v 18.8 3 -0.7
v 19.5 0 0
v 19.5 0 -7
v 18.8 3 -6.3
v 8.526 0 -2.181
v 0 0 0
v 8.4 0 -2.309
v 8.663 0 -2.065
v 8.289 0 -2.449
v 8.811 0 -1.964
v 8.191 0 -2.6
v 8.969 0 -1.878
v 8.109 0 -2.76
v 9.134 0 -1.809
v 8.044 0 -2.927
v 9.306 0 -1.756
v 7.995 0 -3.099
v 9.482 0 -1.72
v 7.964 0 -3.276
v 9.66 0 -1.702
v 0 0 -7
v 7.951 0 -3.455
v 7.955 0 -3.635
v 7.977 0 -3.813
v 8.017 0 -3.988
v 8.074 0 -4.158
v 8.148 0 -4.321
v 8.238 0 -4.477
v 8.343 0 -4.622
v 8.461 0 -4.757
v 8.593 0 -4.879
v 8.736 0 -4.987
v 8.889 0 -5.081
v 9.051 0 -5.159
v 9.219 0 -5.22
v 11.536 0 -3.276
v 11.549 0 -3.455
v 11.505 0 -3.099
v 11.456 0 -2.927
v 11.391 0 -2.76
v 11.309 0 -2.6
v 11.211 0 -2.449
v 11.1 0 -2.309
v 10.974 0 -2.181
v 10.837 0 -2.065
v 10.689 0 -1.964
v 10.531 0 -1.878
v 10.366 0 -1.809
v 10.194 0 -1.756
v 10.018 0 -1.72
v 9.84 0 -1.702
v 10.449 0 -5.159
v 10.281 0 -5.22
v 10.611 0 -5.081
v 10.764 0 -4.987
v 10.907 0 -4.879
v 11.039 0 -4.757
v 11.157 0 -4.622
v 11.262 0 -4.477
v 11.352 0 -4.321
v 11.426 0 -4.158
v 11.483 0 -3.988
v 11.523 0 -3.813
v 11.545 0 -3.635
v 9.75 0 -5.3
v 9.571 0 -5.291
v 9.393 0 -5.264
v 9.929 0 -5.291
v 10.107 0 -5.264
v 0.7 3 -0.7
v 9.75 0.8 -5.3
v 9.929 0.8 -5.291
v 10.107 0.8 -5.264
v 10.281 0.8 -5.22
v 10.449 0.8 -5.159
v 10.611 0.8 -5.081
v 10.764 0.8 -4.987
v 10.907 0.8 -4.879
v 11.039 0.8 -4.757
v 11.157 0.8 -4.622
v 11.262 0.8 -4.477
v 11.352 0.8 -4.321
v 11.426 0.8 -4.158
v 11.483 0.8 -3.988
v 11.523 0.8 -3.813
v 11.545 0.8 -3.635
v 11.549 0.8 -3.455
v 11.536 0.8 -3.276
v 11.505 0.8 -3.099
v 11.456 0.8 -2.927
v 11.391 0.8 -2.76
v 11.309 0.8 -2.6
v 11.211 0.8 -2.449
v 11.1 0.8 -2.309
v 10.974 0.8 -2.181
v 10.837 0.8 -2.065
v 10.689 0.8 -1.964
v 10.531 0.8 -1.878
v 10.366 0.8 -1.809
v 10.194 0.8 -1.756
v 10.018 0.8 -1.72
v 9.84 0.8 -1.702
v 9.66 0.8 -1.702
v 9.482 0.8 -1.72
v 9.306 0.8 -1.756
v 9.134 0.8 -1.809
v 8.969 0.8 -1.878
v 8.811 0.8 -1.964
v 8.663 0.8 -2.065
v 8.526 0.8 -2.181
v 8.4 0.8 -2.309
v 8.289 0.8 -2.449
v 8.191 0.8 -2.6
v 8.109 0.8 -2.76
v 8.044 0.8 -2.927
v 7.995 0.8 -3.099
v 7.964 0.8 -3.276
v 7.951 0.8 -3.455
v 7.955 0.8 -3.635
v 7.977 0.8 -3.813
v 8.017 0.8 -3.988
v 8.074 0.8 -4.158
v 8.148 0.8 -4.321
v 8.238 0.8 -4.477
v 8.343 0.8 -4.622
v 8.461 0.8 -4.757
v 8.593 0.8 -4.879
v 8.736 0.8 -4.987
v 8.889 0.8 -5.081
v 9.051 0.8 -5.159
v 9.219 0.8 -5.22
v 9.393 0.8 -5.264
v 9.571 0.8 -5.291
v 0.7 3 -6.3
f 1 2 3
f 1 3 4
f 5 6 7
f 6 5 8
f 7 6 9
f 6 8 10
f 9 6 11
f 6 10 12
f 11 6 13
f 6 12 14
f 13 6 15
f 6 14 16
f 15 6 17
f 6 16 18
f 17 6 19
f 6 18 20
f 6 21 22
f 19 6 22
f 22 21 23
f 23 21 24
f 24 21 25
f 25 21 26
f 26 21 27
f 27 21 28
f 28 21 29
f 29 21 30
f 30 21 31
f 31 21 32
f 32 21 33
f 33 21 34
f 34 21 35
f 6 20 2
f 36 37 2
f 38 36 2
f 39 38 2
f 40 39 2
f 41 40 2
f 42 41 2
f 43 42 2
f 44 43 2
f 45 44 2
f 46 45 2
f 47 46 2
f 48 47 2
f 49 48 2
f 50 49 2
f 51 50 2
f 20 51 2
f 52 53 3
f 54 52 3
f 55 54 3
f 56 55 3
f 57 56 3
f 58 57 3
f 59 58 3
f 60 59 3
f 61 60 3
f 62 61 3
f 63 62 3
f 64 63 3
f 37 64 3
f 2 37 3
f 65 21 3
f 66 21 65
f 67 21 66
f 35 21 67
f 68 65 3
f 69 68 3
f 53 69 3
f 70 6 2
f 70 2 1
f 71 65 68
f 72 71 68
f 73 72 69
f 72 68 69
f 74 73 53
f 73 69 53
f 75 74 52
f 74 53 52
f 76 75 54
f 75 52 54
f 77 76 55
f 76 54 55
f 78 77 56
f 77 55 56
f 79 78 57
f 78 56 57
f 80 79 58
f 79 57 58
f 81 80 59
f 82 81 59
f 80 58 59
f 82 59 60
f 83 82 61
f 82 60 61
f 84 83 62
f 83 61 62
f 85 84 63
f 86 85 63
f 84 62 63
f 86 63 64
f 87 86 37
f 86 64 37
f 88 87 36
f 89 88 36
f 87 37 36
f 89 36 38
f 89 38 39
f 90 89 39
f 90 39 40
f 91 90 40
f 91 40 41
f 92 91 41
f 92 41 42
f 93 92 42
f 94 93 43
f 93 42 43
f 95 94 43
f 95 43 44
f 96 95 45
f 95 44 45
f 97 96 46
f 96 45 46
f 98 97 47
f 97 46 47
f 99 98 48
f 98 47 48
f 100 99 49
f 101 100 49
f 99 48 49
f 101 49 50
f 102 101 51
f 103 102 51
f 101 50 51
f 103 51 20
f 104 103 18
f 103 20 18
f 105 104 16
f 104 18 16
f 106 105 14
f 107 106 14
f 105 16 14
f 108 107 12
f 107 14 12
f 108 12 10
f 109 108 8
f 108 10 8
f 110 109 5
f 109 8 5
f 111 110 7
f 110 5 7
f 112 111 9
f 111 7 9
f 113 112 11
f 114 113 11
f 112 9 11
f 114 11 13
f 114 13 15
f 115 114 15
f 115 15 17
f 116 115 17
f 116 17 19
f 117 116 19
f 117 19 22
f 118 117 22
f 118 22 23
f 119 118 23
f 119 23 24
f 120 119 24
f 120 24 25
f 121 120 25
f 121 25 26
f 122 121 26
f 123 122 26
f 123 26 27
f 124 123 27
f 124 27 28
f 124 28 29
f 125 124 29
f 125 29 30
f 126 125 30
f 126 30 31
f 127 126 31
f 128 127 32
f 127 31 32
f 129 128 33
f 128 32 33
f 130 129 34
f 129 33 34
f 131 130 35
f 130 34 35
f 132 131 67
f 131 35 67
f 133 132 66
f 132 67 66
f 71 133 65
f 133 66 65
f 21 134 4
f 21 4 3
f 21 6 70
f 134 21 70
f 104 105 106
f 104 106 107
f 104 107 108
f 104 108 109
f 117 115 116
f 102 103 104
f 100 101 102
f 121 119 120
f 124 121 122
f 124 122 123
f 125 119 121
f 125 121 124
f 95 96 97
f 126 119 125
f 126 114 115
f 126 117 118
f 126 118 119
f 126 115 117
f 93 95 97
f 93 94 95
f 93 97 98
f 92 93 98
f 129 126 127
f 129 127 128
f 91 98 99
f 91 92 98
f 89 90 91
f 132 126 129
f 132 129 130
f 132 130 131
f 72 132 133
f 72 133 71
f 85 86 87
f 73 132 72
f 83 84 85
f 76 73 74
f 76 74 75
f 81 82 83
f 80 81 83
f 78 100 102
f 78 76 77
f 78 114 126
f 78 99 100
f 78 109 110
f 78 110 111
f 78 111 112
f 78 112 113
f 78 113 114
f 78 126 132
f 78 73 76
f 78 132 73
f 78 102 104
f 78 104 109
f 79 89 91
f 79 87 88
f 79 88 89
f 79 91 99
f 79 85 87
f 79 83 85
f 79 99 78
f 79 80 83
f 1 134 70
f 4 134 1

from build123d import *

# Parameters (mm, degrees)
SKETCH1_W               = 19.5
SKETCH1_H               = 7
BOSS_EXTRUDE1_DEPTH     = 3
CUT_EXTRUDE1_DEPTH      = 7
CUT_EXTRUDE2_DEPTH      = 21.934421415
CUT_EXTRUDE2_DEPTH_BACK = 21.934421415
SKETCH4_R               = 1.8
CUT_EXTRUDE3_DEPTH      = 0.8


with BuildPart() as part:
    # Sketch1 → Boss-Extrude1 (new body)
    with BuildSketch(Plane(origin=(0, 0, 0), x_dir=(1, 0, 0), z_dir=(0, 1, 0))):
        with Locations((9.75, 3.5)):
            Rectangle(SKETCH1_W, SKETCH1_H)
    extrude(amount=BOSS_EXTRUDE1_DEPTH)

    # Sketch2 → Cut-Extrude1 (cut)
    with BuildSketch(Plane.XY):
        Polygon((0, 0), (0.7, 3), (0, 3), align=None)
        Polygon((19.5, 0), (18.8, 3), (19.5, 3), align=None)
    extrude(amount=-CUT_EXTRUDE1_DEPTH, mode=Mode.SUBTRACT)

    # Sketch3 → Cut-Extrude2 (cut, two sides: drawn at the far end of the back side and taken through both)
    with BuildSketch(Plane(origin=(0, 0, 0), x_dir=(0, 0, -1), z_dir=(1, 0, 0)).offset(-CUT_EXTRUDE2_DEPTH_BACK)):
        Polygon((0, 0), (0.7, 3), (0, 3), align=None)
        Polygon((7, 3), (6.3, 3), (7, 0), align=None)
    extrude(amount=CUT_EXTRUDE2_DEPTH + CUT_EXTRUDE2_DEPTH_BACK, mode=Mode.SUBTRACT)

    # Sketch4 → Cut-Extrude3 (cut)
    with BuildSketch(Plane.XZ):
        with Locations(Location((9.75, -3.5, 0), (0, 0, 270))):
            Circle(SKETCH4_R)
    extrude(amount=-CUT_EXTRUDE3_DEPTH, mode=Mode.SUBTRACT)


solid = part.part
